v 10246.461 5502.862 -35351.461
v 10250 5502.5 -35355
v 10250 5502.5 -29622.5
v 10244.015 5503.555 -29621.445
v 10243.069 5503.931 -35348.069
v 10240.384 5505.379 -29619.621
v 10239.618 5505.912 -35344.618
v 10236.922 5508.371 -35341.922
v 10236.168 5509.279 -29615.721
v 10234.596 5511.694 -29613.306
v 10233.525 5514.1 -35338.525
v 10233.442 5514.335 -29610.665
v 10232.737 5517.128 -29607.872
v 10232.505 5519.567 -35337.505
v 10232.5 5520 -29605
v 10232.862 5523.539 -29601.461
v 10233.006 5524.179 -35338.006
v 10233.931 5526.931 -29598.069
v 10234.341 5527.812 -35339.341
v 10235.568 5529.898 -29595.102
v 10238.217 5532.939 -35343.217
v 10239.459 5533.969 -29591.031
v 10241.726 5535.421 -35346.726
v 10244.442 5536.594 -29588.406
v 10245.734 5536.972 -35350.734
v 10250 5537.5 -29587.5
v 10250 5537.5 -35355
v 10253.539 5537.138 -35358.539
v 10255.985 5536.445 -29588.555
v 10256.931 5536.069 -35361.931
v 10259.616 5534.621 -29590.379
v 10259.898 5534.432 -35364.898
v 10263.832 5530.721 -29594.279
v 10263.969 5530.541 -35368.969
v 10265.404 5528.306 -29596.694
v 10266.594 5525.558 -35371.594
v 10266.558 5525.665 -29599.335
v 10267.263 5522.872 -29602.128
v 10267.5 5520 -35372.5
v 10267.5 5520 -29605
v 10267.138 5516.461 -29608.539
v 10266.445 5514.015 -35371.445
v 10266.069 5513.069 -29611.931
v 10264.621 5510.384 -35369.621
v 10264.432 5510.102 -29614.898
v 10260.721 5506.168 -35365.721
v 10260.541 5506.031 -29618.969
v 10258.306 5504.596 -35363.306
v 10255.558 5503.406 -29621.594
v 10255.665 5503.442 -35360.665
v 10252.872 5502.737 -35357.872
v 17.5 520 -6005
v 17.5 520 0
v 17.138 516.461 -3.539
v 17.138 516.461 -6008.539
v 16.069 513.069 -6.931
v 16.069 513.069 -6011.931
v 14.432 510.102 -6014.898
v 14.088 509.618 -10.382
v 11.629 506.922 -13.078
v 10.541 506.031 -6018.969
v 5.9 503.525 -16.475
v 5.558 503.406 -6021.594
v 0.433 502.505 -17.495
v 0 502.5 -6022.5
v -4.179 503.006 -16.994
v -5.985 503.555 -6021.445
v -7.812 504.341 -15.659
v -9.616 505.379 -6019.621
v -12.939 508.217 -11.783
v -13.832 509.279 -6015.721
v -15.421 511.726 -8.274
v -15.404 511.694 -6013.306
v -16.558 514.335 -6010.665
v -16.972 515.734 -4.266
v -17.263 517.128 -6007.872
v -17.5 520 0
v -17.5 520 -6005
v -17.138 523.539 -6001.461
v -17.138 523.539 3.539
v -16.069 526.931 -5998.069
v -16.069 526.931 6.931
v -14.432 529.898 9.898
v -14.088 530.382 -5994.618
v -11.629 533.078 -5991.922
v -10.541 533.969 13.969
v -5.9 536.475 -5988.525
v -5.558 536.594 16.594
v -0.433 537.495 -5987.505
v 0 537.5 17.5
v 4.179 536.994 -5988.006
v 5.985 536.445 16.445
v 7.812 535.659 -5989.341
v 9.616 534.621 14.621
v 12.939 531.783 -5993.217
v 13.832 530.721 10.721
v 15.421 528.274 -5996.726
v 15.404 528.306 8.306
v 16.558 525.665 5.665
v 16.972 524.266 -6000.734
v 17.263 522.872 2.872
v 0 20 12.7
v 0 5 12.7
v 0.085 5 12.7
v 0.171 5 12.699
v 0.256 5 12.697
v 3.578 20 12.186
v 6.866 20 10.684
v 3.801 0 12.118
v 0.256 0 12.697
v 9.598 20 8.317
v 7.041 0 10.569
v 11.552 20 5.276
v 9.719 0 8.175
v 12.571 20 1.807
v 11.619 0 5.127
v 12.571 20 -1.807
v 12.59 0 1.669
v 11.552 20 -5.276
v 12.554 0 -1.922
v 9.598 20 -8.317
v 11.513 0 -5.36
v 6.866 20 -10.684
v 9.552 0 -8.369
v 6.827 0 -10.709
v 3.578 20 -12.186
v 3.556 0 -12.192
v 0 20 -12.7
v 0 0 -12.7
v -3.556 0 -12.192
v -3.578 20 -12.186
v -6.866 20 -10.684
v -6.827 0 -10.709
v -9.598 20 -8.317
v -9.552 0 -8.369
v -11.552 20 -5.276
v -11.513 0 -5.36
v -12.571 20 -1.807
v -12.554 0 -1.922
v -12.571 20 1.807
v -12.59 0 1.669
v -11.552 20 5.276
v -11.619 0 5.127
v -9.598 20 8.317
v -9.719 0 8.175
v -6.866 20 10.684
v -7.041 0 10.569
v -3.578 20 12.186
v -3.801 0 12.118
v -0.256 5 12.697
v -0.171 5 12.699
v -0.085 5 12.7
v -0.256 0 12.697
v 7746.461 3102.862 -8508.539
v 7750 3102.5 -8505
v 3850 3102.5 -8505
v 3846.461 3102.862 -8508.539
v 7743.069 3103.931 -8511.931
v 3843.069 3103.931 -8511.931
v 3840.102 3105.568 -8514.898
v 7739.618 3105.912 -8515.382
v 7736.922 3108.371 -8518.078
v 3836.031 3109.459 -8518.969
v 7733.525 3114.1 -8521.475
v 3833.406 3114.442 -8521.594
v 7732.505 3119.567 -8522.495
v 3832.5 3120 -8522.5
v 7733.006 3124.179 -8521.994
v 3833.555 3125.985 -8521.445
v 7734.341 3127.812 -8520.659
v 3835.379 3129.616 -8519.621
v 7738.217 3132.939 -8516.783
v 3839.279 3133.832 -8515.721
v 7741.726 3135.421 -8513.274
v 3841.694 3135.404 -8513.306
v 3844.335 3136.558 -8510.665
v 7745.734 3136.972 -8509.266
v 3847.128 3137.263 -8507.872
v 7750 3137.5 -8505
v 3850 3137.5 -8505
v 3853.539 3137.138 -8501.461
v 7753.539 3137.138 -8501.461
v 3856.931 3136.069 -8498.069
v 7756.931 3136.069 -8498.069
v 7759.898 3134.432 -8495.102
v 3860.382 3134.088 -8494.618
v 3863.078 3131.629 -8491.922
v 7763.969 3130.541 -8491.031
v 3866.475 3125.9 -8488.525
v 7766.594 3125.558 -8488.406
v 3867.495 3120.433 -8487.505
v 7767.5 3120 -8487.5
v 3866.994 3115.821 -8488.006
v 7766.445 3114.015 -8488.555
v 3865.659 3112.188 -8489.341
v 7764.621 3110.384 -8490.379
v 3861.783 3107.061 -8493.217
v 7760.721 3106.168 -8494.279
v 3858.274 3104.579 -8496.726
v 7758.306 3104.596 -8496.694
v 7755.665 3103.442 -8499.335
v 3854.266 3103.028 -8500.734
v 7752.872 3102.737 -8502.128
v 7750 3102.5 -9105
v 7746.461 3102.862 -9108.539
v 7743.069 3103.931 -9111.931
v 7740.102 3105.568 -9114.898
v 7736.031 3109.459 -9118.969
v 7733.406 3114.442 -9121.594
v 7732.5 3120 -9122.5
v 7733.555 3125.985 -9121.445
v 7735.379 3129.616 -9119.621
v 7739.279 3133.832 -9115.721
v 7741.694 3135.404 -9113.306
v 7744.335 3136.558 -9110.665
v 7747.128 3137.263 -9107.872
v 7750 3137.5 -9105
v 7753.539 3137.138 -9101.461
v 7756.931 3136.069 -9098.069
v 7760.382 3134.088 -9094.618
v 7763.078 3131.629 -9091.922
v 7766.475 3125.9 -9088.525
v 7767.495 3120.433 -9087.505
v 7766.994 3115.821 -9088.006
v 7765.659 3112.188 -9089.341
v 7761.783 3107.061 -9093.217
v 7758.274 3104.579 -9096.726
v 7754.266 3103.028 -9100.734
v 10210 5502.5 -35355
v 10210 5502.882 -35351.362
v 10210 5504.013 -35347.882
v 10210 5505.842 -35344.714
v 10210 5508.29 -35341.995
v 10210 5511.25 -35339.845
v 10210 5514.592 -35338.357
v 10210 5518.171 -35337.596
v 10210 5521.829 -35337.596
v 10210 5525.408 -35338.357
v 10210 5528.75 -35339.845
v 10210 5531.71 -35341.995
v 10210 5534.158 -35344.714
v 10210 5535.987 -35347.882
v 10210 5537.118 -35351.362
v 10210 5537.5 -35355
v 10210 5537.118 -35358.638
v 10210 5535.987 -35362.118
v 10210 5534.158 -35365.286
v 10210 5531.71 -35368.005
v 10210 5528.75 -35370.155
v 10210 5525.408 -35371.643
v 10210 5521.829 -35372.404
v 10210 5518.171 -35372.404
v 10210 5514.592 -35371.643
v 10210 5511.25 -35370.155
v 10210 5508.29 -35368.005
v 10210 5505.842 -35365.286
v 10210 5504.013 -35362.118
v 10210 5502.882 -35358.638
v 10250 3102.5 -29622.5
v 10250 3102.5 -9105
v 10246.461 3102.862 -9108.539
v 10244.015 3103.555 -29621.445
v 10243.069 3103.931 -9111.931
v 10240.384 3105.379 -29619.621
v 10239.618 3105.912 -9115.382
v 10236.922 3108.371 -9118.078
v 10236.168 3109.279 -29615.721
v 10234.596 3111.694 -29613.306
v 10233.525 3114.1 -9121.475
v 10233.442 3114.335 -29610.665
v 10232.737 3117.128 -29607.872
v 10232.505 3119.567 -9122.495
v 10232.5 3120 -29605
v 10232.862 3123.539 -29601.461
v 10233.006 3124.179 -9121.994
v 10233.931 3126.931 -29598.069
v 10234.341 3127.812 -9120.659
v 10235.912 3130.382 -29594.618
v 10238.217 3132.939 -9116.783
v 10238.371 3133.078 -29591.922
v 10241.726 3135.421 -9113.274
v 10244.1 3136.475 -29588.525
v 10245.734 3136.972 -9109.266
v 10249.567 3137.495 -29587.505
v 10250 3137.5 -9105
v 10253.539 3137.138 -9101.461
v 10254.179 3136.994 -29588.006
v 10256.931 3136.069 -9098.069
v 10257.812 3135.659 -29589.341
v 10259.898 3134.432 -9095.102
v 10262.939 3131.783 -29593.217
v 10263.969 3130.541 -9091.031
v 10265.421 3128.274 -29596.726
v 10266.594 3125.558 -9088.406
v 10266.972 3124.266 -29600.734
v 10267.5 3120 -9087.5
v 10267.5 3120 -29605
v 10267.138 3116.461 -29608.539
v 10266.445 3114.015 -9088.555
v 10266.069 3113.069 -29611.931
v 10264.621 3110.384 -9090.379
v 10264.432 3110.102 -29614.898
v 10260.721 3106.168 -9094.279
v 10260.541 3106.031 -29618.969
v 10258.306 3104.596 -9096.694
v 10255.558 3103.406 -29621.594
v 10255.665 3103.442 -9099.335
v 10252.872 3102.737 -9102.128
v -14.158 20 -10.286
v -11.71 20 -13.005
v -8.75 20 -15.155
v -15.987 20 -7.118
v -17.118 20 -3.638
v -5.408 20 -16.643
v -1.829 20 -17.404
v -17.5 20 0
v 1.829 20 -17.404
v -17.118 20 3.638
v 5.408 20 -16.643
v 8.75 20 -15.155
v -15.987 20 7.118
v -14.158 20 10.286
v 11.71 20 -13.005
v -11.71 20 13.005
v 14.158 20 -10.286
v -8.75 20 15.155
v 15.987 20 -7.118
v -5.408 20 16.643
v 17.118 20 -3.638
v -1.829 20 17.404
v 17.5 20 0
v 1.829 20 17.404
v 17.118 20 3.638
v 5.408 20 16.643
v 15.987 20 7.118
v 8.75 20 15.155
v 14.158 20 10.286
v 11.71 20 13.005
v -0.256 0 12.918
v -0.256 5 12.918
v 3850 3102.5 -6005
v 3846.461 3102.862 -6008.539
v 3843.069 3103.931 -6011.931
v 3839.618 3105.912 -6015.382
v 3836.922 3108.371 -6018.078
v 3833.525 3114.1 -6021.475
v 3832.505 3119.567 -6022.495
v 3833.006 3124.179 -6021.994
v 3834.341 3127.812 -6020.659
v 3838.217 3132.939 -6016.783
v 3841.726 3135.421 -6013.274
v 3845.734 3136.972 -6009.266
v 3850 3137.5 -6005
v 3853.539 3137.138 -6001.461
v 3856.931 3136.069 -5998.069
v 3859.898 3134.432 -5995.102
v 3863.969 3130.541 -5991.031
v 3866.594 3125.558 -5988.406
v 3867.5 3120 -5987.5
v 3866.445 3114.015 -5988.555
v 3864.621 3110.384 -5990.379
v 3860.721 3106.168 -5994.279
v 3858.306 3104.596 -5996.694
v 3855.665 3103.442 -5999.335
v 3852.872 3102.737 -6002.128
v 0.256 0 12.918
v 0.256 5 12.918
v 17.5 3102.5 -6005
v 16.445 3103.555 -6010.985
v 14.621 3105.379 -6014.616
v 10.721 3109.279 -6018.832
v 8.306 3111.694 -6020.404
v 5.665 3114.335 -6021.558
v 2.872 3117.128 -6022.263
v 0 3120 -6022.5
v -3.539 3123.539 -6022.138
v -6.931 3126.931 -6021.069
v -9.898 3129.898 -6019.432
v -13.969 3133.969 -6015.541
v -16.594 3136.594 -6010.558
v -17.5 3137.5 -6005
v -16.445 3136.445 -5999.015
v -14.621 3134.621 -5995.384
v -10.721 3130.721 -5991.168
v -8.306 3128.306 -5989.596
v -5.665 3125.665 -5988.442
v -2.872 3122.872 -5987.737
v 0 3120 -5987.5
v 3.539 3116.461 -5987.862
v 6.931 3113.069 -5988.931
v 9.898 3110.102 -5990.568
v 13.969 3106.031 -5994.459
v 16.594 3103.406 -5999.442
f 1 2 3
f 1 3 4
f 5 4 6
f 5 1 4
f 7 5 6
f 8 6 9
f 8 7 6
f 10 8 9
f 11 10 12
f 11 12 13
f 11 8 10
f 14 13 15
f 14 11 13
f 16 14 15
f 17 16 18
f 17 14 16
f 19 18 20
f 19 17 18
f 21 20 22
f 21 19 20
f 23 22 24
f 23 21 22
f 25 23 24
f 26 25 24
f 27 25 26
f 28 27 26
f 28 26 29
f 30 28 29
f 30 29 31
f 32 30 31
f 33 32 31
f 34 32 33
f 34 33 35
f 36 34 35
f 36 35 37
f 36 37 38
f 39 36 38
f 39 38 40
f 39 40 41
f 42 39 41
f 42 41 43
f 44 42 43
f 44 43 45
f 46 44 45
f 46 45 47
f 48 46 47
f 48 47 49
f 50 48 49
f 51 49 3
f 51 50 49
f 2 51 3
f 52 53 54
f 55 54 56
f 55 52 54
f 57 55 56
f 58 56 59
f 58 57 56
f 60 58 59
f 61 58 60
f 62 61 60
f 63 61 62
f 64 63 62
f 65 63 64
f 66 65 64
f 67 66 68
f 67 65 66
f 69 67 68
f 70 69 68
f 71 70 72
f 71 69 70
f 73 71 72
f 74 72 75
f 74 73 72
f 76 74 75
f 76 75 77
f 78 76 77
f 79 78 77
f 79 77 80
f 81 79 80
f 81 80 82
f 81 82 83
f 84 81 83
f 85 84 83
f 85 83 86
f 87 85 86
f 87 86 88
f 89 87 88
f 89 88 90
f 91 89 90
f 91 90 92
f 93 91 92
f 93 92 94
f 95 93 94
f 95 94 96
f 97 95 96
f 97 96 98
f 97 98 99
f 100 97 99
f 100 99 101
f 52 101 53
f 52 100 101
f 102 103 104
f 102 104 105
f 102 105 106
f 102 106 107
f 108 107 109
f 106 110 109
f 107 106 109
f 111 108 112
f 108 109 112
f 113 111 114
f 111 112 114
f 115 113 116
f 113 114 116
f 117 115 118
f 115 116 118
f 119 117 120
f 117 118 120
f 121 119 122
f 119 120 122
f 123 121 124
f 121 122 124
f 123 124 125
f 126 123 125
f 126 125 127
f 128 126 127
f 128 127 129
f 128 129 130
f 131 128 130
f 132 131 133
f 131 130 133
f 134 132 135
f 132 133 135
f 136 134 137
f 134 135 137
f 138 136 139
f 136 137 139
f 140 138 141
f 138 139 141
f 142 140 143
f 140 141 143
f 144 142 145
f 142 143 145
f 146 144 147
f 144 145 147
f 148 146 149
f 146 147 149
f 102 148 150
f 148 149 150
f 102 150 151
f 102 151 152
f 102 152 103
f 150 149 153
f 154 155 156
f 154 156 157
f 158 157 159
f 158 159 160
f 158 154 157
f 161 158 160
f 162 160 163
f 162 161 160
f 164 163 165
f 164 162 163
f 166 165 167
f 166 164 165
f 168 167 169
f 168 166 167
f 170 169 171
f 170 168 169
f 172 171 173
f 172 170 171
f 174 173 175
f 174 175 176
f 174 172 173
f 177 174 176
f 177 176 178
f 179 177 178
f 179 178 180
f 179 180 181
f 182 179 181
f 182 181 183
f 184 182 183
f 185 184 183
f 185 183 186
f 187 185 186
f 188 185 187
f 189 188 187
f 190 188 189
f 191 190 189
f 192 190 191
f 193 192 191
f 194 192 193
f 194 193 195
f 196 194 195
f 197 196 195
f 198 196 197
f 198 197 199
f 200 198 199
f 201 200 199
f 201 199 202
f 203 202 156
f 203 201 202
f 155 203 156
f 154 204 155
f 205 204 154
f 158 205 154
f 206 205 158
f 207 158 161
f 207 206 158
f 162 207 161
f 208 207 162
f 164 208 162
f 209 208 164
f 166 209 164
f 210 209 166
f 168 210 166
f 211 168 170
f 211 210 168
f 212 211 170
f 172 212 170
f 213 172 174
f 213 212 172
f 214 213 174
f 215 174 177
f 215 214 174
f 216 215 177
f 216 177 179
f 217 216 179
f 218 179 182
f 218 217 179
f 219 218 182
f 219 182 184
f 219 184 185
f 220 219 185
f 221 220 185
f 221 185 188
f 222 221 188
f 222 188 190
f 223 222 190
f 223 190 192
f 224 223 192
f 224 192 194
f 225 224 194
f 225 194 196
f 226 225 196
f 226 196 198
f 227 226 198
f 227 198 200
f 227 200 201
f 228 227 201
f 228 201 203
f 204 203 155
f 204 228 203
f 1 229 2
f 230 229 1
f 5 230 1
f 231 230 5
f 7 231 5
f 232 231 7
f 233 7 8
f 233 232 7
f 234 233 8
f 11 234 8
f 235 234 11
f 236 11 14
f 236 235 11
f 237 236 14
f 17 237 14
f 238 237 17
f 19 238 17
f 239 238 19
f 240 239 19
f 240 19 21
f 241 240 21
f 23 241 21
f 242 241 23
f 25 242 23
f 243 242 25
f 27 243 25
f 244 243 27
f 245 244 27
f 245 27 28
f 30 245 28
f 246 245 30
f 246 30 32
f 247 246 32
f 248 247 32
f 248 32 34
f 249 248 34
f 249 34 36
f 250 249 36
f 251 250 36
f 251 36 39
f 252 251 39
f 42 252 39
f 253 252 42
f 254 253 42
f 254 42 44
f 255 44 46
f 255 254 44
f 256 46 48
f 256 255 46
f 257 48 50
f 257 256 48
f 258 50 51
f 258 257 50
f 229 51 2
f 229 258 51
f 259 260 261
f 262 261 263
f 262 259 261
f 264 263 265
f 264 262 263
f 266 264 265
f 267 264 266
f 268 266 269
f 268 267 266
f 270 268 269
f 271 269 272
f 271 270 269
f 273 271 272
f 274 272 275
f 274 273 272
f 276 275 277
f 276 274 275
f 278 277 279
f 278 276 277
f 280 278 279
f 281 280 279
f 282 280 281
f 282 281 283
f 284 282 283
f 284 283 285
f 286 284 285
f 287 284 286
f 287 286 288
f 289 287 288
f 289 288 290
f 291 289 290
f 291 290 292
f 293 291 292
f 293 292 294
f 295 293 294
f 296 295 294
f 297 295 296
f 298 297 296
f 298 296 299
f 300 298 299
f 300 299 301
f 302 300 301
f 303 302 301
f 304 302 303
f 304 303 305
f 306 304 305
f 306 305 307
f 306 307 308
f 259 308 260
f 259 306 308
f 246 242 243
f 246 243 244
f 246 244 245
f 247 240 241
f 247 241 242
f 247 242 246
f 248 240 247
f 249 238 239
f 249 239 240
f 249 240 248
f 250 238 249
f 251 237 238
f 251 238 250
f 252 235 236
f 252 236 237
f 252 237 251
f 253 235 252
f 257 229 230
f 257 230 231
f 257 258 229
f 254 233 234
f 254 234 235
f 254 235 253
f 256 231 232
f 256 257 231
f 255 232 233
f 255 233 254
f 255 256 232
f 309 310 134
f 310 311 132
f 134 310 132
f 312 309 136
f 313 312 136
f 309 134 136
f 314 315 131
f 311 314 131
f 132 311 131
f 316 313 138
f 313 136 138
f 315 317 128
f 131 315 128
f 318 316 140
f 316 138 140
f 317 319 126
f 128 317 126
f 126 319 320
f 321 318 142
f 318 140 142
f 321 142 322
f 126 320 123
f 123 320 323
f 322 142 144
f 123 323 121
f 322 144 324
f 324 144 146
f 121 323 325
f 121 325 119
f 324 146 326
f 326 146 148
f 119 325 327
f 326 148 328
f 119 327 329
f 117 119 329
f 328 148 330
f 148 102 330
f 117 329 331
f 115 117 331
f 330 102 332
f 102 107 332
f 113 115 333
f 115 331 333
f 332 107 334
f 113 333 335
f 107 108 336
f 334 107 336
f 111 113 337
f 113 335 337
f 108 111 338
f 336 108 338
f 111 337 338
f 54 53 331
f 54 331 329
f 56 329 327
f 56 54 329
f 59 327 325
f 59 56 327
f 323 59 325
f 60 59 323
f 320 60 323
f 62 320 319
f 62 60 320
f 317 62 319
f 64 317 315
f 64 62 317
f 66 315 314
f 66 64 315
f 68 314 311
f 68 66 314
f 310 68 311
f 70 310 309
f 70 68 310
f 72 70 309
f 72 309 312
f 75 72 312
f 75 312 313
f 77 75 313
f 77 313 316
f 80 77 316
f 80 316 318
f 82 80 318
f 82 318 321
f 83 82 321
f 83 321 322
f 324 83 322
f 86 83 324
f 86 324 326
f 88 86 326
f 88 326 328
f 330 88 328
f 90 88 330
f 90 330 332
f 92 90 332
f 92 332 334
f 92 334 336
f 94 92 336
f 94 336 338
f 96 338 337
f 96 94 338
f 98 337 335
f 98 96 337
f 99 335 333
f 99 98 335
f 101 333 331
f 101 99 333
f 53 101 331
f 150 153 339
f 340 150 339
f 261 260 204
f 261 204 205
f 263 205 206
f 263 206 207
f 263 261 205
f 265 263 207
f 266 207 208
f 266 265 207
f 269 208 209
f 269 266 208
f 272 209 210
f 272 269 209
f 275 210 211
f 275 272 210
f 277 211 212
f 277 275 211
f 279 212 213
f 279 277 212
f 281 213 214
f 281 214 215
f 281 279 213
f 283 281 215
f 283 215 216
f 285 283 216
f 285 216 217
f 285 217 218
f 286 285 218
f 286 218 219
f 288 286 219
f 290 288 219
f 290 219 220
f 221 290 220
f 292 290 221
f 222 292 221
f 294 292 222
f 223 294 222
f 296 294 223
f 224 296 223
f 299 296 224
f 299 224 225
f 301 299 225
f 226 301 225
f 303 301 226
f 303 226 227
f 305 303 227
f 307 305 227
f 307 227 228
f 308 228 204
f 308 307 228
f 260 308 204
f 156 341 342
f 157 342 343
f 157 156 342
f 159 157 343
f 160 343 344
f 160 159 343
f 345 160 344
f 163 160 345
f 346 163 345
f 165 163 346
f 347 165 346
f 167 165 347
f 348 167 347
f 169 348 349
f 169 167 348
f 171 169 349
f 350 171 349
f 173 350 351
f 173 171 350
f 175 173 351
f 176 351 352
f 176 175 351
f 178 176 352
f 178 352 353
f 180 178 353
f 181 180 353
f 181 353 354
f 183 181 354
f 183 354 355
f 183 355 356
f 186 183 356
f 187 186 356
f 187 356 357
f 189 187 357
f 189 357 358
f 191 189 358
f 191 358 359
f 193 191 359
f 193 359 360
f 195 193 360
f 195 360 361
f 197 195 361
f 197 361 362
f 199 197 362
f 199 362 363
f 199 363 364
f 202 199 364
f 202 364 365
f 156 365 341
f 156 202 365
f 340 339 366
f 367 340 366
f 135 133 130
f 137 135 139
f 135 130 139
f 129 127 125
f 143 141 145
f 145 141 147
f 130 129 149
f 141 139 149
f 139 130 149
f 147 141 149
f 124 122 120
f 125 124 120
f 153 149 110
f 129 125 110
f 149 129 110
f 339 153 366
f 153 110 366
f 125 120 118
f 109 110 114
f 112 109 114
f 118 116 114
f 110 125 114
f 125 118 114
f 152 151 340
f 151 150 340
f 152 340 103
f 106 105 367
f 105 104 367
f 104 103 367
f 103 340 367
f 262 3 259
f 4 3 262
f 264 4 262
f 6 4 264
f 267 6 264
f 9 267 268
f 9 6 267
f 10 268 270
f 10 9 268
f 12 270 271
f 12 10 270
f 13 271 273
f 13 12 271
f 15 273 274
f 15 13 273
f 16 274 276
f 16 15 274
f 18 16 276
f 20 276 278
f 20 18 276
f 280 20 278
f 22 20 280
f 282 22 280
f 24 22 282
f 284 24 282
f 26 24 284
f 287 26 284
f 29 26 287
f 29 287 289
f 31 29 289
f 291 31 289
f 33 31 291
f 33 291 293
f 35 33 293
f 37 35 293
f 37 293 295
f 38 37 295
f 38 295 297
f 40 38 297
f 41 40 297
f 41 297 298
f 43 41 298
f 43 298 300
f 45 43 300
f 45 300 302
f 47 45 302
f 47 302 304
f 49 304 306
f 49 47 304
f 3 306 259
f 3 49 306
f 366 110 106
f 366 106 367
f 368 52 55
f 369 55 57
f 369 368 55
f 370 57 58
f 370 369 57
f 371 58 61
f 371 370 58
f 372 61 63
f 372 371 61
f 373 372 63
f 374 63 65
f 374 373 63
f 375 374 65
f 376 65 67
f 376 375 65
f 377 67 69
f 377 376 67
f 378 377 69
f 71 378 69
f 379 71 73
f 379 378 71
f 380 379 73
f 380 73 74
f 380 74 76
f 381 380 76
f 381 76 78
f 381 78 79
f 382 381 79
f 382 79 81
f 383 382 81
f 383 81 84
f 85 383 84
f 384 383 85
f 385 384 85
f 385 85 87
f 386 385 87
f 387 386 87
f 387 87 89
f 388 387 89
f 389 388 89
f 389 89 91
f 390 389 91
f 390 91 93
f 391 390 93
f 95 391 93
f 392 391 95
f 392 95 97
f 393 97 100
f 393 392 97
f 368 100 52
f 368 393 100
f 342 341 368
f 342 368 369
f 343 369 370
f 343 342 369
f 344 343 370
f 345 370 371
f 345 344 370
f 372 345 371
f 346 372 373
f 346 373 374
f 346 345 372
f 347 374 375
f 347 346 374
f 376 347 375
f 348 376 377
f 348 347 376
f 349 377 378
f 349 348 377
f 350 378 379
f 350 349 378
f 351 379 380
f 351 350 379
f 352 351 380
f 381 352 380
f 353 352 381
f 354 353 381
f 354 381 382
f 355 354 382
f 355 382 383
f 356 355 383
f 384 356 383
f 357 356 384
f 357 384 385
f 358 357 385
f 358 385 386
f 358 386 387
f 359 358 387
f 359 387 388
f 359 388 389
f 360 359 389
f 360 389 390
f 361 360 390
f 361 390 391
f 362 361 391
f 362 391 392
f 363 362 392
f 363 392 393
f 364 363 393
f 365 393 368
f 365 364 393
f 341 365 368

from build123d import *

# Parameters (mm, degrees)
CROQUIS2_R              = 12.7
SALIENTE_EXTRUIR1_DEPTH = 20
CROQUIS3_R              = 17.5
CROQUIS4_W              = 0.511597732
CROQUIS4_H              = 0.43534191
SALIENTE_EXTRUIR2_DEPTH = 5


with BuildPart() as part:
    # Croquis2 → Saliente-Extruir1 (new body)
    with BuildSketch(Plane(origin=(0, 0, 0), x_dir=(1, 0, 0), z_dir=(0, 1, 0))):
        with Locations(Location((0, 0, 0), (0, 0, 270))):
            Circle(CROQUIS2_R)
    extrude(amount=SALIENTE_EXTRUIR1_DEPTH)

    # Barrer1: sweep along a curve in space
    with BuildLine() as barrer1_path:
        Line((0, 20, 0), (0, 520, 0))
        Line((0, 520, 0), (0, 520, -6005))
        Line((0, 520, -6005), (0, 3120, -6005))
        Line((0, 3120, -6005), (3850, 3120, -6005))
        Line((3850, 3120, -6005), (3850, 3120, -8505))
        Line((3850, 3120, -8505), (7750, 3120, -8505))
        Line((7750, 3120, -8505), (7750, 3120, -9105))
        Line((7750, 3120, -9105), (10250, 3120, -9105))
        Line((10250, 3120, -9105), (10250, 3120, -29605))
        Line((10250, 3120, -29605), (10250, 5520, -29605))
        Line((10250, 5520, -29605), (10250, 5520, -35355))
        Line((10250, 5520, -35355), (10210, 5520, -35355))
    # Croquis3 → Barrer1 (sweep)
    with BuildSketch(Plane(origin=(0, 20, 0), x_dir=(1, 0, 0), z_dir=(0, 1, 0))):
        Circle(CROQUIS3_R)
    sweep(path=barrer1_path.line, transition=Transition.RIGHT)

    # Croquis4 → Saliente-Extruir2 (add)
    with BuildSketch(Plane.XZ):
        with Locations((0, 12.7)):
            Rectangle(CROQUIS4_W, CROQUIS4_H)
    extrude(amount=-SALIENTE_EXTRUIR2_DEPTH)


solid = part.part
